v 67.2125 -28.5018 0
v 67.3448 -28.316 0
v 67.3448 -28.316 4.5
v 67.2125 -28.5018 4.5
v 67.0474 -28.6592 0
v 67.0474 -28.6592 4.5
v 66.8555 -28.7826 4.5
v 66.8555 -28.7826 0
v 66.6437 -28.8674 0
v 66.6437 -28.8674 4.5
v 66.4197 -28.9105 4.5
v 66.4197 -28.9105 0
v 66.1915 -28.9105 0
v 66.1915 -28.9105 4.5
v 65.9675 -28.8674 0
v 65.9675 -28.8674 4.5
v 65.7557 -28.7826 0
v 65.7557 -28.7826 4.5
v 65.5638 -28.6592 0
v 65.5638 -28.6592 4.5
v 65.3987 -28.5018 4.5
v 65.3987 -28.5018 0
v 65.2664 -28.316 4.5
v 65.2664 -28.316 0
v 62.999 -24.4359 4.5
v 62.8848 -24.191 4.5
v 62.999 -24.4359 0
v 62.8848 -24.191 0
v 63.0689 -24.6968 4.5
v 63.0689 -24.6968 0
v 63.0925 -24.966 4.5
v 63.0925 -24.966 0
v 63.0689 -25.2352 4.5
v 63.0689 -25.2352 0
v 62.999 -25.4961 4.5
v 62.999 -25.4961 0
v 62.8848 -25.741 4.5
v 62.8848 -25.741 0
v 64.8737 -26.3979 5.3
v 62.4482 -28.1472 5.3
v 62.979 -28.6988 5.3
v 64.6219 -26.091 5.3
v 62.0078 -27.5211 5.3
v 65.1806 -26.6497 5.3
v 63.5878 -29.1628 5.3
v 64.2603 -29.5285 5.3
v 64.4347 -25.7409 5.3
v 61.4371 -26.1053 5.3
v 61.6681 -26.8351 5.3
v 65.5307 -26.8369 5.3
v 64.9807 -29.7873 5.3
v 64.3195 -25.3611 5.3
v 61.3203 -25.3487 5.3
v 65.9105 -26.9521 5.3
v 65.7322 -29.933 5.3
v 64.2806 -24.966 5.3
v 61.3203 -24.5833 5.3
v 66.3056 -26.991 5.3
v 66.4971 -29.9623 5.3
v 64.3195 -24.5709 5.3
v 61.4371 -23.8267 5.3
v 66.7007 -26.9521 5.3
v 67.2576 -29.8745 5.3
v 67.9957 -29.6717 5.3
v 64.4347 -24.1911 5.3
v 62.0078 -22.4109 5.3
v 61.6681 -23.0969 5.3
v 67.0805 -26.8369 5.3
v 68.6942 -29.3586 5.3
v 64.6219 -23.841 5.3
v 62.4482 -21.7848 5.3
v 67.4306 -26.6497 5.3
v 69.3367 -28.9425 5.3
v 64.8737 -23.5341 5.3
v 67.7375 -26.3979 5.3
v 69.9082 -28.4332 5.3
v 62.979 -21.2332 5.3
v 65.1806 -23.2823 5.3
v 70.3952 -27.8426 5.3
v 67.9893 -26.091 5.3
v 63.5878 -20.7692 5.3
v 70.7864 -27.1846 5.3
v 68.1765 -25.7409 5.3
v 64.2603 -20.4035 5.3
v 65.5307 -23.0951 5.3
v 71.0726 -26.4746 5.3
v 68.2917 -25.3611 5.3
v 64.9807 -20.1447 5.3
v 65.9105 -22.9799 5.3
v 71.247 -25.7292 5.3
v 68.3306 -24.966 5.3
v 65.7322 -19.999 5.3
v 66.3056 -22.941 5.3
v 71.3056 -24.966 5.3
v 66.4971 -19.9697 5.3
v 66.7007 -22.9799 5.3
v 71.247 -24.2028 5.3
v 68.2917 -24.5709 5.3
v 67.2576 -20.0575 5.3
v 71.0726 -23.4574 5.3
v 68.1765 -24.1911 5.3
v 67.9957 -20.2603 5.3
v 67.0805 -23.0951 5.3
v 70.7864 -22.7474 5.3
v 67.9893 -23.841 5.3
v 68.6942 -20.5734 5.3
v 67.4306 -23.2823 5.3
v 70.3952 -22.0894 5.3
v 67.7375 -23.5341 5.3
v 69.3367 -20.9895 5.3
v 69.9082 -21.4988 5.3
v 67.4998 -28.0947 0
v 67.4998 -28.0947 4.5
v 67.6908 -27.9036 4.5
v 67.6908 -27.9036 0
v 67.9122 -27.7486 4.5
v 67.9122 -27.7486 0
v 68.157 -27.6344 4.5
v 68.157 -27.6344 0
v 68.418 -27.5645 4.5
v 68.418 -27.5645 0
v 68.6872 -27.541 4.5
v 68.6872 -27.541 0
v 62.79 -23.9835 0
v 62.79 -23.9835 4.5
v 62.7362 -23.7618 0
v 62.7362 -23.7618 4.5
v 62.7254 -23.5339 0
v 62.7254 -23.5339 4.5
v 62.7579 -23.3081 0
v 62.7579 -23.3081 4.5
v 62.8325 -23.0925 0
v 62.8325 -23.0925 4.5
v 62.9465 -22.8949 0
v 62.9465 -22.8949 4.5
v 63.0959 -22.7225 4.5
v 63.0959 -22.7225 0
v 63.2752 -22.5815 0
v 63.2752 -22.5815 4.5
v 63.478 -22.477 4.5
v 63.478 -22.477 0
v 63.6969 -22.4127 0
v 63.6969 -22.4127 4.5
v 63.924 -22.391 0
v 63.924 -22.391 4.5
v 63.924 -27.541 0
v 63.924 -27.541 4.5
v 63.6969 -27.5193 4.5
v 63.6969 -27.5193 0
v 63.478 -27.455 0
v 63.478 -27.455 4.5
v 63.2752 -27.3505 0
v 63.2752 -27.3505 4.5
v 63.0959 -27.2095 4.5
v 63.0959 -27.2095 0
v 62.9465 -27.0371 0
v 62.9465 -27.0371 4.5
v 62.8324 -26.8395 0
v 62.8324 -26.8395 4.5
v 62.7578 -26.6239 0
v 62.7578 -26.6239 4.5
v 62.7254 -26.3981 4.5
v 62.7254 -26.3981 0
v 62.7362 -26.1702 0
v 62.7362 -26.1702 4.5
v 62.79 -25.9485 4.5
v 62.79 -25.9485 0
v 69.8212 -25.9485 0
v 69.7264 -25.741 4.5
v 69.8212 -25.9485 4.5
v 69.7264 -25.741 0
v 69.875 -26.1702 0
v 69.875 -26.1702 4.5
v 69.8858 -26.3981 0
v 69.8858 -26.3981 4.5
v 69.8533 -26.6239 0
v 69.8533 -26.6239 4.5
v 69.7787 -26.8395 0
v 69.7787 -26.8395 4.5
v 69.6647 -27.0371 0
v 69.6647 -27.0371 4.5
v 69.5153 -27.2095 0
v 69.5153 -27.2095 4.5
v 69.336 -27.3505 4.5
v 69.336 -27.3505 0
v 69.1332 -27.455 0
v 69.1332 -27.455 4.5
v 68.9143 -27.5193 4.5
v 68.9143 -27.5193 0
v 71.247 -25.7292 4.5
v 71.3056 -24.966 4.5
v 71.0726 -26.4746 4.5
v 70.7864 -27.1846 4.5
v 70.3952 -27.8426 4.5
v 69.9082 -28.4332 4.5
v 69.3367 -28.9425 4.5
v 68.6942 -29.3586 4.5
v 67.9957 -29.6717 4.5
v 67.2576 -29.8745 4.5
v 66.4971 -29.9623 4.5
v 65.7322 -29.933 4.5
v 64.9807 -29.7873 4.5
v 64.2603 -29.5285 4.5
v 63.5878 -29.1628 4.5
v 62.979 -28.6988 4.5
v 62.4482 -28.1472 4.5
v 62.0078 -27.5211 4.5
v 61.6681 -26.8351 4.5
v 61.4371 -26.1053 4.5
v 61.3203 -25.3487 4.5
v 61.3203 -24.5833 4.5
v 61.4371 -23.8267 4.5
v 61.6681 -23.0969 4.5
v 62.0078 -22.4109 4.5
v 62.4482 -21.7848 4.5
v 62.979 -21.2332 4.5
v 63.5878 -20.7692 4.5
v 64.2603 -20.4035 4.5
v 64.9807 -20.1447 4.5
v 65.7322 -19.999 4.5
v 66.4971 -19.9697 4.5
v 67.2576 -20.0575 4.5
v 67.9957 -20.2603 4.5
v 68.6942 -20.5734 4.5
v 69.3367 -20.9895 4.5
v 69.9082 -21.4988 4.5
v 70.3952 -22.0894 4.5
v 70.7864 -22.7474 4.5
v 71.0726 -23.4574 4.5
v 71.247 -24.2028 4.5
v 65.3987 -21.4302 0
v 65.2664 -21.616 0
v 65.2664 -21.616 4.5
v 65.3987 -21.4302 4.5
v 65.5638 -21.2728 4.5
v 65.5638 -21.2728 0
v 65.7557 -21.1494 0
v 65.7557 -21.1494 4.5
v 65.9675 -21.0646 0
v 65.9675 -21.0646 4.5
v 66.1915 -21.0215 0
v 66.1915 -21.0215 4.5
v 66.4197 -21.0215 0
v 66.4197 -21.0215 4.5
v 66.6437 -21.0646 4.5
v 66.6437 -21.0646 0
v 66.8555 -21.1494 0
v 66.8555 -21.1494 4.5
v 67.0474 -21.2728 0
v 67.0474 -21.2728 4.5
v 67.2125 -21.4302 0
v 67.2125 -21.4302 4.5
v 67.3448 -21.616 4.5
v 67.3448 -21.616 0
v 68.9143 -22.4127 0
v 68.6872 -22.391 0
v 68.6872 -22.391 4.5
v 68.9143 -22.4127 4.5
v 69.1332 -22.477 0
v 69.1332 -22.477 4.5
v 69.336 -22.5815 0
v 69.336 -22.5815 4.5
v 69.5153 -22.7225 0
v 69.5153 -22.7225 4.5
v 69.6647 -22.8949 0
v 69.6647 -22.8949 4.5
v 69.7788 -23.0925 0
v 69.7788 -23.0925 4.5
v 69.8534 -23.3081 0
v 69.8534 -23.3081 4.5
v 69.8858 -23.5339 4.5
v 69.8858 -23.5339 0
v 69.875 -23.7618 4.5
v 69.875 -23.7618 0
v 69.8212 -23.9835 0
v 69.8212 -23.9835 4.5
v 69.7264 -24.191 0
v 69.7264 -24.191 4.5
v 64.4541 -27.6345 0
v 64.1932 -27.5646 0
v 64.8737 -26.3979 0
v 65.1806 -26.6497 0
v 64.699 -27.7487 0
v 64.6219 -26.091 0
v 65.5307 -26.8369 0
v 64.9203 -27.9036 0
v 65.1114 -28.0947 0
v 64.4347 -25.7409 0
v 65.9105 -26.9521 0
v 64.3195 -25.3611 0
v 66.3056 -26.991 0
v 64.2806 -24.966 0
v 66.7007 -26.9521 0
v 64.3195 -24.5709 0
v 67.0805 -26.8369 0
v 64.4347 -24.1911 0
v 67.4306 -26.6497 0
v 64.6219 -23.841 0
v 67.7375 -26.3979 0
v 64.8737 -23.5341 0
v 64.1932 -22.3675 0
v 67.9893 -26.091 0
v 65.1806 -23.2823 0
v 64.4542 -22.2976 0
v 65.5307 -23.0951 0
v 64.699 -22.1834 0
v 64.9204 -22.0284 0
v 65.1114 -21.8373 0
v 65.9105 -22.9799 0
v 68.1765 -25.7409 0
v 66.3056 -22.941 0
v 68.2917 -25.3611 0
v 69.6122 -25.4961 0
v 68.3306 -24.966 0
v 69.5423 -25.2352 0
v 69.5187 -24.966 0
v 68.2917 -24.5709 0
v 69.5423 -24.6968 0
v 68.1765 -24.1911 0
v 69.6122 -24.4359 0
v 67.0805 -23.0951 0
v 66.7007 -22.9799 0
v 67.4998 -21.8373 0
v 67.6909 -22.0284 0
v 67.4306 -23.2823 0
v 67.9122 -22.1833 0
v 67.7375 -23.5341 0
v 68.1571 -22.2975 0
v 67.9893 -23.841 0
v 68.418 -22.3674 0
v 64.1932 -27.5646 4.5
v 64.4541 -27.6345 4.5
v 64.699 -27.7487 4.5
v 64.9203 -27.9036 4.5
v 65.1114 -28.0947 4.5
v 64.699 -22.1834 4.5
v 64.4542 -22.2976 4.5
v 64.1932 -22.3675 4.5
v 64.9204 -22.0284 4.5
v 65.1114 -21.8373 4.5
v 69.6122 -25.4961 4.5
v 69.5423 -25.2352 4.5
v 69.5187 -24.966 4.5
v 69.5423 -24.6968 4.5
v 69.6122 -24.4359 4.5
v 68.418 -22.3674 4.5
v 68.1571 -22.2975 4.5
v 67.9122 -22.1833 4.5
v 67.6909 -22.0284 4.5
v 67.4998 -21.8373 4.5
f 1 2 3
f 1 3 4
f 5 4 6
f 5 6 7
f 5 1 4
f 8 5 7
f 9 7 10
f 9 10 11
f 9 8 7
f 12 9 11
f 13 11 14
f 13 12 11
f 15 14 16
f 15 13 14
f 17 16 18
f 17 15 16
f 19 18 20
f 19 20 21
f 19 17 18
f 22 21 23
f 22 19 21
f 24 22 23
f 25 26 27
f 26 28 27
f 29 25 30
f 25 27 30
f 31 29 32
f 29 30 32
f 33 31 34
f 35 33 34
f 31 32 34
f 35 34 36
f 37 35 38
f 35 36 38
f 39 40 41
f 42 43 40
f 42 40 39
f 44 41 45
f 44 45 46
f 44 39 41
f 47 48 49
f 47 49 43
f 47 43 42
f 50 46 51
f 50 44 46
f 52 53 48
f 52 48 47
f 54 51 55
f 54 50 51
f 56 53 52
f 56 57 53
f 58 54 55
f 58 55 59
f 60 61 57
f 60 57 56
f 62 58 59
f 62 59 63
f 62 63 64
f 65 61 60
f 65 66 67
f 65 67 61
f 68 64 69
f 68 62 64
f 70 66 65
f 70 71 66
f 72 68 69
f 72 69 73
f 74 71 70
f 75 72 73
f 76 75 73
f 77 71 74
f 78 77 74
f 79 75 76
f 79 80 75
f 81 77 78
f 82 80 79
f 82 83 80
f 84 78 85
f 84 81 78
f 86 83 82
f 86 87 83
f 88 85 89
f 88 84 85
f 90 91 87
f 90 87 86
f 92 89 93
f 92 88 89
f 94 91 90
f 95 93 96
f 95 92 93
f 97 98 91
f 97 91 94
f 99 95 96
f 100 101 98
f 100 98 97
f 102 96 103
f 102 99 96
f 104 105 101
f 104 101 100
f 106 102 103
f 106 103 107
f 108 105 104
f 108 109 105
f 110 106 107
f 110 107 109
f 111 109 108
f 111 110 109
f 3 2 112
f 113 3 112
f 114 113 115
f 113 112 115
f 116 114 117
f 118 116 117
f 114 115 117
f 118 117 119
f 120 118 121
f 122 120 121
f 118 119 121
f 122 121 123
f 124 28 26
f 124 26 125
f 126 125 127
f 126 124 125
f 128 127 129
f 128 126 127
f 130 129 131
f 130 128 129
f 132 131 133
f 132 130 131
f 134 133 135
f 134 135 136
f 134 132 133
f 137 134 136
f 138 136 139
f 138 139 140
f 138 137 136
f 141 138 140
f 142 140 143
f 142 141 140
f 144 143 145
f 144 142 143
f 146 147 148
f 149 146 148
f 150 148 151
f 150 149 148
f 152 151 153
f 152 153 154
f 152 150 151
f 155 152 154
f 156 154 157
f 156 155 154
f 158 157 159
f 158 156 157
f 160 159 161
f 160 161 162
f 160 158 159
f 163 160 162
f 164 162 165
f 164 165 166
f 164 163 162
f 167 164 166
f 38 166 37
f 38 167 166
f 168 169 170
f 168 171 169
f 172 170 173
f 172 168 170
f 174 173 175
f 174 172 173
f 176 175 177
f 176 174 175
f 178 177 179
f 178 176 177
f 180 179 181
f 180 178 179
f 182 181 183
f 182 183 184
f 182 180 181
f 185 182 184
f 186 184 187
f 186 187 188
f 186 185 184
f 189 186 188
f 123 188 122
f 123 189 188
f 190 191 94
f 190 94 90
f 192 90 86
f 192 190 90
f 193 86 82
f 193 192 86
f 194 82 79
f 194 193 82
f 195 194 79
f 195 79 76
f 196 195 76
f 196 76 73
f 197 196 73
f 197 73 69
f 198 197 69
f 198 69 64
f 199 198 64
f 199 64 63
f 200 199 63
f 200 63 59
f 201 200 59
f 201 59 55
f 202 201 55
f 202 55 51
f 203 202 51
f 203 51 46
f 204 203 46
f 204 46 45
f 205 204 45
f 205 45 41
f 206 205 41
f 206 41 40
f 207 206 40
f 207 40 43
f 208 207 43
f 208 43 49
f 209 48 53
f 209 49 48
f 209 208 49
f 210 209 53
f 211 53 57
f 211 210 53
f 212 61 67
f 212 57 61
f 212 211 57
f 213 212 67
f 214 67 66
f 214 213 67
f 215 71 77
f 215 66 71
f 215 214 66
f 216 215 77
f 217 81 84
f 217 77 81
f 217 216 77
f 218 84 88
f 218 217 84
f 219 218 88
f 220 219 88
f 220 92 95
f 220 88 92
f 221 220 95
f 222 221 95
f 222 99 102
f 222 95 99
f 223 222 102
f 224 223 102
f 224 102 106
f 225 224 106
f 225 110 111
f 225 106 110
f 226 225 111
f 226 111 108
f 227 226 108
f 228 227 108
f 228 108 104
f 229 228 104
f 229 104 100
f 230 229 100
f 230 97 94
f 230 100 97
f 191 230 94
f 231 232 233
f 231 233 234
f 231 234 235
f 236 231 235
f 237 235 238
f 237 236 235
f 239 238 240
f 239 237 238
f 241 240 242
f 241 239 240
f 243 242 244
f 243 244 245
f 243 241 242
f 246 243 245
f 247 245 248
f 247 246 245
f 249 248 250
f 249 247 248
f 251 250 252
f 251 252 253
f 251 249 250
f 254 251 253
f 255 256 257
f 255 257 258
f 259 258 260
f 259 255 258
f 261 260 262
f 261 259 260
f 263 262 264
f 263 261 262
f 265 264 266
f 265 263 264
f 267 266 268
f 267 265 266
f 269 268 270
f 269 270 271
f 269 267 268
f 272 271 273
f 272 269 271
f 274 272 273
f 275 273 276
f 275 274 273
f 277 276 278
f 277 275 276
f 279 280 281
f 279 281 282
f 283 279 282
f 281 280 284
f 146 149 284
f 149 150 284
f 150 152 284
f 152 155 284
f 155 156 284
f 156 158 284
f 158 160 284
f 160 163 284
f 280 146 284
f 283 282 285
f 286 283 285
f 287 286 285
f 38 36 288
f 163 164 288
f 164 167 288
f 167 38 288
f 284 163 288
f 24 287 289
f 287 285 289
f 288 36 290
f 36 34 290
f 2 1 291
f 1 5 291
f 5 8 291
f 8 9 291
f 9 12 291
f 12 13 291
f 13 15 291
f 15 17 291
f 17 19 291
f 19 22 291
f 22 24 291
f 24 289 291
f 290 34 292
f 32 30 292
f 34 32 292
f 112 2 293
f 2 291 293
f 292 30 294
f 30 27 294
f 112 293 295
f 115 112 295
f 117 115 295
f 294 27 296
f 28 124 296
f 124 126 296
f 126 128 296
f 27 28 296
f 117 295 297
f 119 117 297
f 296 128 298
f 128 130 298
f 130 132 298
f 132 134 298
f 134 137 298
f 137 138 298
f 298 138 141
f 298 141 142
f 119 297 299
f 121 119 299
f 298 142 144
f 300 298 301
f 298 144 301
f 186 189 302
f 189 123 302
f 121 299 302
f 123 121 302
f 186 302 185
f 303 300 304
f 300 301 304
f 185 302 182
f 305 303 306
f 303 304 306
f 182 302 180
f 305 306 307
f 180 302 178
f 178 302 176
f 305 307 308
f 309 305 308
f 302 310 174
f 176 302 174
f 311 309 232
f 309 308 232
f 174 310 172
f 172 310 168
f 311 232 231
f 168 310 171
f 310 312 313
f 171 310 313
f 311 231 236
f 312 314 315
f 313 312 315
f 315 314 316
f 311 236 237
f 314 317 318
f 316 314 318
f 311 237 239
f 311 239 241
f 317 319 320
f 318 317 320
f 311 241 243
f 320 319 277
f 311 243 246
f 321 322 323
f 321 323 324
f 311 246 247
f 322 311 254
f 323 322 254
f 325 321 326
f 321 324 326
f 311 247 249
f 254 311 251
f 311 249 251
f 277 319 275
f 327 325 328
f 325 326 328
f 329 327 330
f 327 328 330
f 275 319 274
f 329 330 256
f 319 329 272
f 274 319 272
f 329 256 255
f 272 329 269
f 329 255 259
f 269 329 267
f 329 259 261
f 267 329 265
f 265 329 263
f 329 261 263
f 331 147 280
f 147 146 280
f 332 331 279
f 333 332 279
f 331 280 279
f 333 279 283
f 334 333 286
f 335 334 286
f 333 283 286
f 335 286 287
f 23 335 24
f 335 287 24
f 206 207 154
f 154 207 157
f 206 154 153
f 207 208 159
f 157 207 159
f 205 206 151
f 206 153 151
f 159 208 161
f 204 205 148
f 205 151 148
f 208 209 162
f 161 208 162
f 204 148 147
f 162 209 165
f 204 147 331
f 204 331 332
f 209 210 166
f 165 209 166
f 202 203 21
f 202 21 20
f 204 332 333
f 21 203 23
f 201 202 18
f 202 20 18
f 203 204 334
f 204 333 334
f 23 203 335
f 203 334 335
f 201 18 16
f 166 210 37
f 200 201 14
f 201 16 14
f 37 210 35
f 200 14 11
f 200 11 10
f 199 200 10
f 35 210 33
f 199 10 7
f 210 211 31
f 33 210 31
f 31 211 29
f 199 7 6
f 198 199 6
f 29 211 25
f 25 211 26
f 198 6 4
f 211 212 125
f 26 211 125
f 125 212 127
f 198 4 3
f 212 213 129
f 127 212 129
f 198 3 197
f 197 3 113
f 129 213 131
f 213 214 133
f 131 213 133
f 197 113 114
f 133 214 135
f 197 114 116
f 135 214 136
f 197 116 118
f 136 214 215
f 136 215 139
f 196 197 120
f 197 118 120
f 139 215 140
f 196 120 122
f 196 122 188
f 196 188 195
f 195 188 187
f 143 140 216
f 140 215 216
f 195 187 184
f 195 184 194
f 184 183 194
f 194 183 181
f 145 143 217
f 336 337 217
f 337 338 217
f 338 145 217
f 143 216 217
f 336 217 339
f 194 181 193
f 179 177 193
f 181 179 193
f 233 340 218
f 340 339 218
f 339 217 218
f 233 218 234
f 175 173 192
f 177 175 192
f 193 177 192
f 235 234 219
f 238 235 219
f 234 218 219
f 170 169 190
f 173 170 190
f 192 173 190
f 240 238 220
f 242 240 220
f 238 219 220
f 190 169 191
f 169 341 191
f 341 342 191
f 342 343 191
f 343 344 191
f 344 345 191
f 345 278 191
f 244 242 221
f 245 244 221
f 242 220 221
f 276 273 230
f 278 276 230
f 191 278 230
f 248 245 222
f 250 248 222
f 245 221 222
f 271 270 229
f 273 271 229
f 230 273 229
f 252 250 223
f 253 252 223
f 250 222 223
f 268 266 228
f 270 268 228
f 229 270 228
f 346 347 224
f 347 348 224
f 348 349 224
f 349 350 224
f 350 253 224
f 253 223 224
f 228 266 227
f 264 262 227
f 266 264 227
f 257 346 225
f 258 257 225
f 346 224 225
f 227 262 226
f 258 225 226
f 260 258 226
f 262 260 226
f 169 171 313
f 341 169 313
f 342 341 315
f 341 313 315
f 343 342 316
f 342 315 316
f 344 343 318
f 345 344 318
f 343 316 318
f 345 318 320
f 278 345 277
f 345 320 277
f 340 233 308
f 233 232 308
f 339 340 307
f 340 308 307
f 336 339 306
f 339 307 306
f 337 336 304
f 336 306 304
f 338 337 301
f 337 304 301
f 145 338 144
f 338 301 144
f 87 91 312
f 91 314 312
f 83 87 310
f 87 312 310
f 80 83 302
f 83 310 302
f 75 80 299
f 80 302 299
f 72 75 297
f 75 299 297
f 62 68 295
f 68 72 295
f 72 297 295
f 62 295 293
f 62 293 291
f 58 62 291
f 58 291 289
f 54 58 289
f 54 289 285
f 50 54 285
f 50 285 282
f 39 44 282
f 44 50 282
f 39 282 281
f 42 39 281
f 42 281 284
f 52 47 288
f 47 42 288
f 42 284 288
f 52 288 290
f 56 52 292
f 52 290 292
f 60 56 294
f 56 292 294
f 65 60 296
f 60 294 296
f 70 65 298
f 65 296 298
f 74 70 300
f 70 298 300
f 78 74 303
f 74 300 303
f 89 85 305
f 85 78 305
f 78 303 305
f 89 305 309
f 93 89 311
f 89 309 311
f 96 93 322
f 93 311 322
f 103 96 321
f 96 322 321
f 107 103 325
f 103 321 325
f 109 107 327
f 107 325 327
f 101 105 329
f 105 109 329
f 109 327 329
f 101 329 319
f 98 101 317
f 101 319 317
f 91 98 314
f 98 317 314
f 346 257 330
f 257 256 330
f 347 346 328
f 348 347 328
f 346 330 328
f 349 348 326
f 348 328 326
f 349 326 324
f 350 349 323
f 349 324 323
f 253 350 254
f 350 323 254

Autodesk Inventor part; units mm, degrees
ref_plane "YZ Plane" through (0, 0, 0) normal (1, 0, 0) x (0, 1, 0)
ref_plane "XZ Plane" through (0, 0, 0) normal (0, 1, 0) x (-1, 0, 0)
ref_plane "XY Plane" through (0, 0, 0) normal (0, 0, 1) x (1, 0, 0)
sketch "スケッチ1" plane through (0, 0, 0) normal (0, 0, 1) x (1, 0, 0)
  arc A0 (69.7697, -24.216) -> (68.6872, -22.341) centre (68.6872, -23.591) ccw
  arc A1 (69.7697, -24.216) -> (69.7697, -25.716) centre (71.0687, -24.966) ccw
  arc A2 (68.6872, -27.591) -> (69.7697, -25.716) centre (68.6872, -26.341) ccw
  arc A3 (65.2231, -28.341) -> (67.3881, -28.341) centre (66.3056, -27.716) ccw
  arc A4 (68.6872, -27.591) -> (67.3881, -28.341) centre (68.6872, -29.091) ccw
  arc A5 (65.2231, -28.341) -> (63.924, -27.591) centre (63.924, -29.091) ccw
  arc A6 (63.924, -22.341) -> (62.8415, -24.216) centre (63.924, -23.591) ccw
  arc A7 (63.924, -22.341) -> (65.2231, -21.591) centre (63.924, -20.841) ccw
  line L0 (62.8415, -22.966) -> (66.3056, -20.966) construction
  circle A8 centre (66.3056, -24.966) radius 5
  arc A9 (67.3881, -21.591) -> (65.2231, -21.591) centre (66.3056, -22.216) ccw
  arc A10 (62.8415, -25.716) -> (62.8415, -24.216) centre (61.5425, -24.966) ccw
  arc A11 (67.3881, -21.591) -> (68.6872, -22.341) centre (68.6872, -20.841) ccw
  line L1 (62.8415, -26.966) -> (62.8415, -22.966) construction
  arc A12 (62.8415, -25.716) -> (63.924, -27.591) centre (63.924, -26.341) ccw
  line L2 (66.3056, -20.966) -> (69.7697, -22.966) construction
  line L3 (66.3056, -28.966) -> (62.8415, -26.966) construction
  circle A13 centre (66.3056, -24.966) radius 4 construction
  circle A14 centre (66.3056, -24.966) radius 3.2631 construction
  line L4 (69.7697, -26.966) -> (66.3056, -28.966) construction
  line L5 (69.7697, -22.966) -> (69.7697, -26.966) construction
  circle A15 centre (66.3056, -24.966) radius 2.025
  point P0 (0, 0)
  point P1 (69.7697, -26.966)
  point P2 (66.3056, -28.966)
  point P3 (65.2231, -28.341)
  point P4 (68.6872, -27.591)
  point P5 (69.7697, -25.716)
  point P6 (69.7697, -24.216)
  point P7 (63.924, -22.341)
  point P8 (62.8415, -25.716)
  point P9 (63.924, -27.591)
  dimension "d5" = 8
  dimension "d4" = 10
  dimension "d6" = 360
  dimension "d7" = 360
  dimension "d8" = 6.5263
  dimension "d9" = 1.5
  dimension "d10" = 1.25
  dimension "d11" = 4.05
extrude "押し出し1" add sketch "スケッチ1" along normal blind 4.5 contours A1 A2 A4 A3 A5 A12 A10 A6 A7 A9 A11 A0
sketch "スケッチ2" plane through (0, 0, 4.5) normal (0, 0, 1) x (1, 0, 0)
  arc A0 (68.6872, -27.591) -> (67.3881, -28.341) centre (68.6872, -29.091) ccw projected
  arc A1 (68.6872, -27.591) -> (69.7697, -25.716) centre (68.6872, -26.341) ccw projected
  arc A2 (69.7697, -24.216) -> (69.7697, -25.716) centre (71.0687, -24.966) ccw projected
  arc A3 (69.7697, -24.216) -> (68.6872, -22.341) centre (68.6872, -23.591) ccw projected
  arc A4 (67.3881, -21.591) -> (68.6872, -22.341) centre (68.6872, -20.841) ccw projected
  arc A5 (67.3881, -21.591) -> (65.2231, -21.591) centre (66.3056, -22.216) ccw projected
  arc A6 (63.924, -22.341) -> (65.2231, -21.591) centre (63.924, -20.841) ccw projected
  arc A7 (63.924, -22.341) -> (62.8415, -24.216) centre (63.924, -23.591) ccw projected
  arc A8 (62.8415, -25.716) -> (62.8415, -24.216) centre (61.5425, -24.966) ccw projected
  arc A9 (62.8415, -25.716) -> (63.924, -27.591) centre (63.924, -26.341) ccw projected
  arc A10 (65.2231, -28.341) -> (63.924, -27.591) centre (63.924, -29.091) ccw projected
  arc A11 (65.2231, -28.341) -> (67.3881, -28.341) centre (66.3056, -27.716) ccw projected
  circle A12 centre (66.3056, -24.966) radius 2.025 projected
  circle A13 centre (66.3056, -24.966) radius 5
  point P0 (0, 0)
  dimension "d14" = 10
extrude "押し出し2" add sketch "スケッチ2" along normal blind 0.8 contours A0 A11 A10 A9 A8 A7 A6 A5 A4 A3 A2 A1 | A13
sketch "スケッチ3" plane through (0, 0, 0) normal (0, 0, -1) x (-1, 0, 0)
  arc A0 (-67.3881, -28.341) -> (-68.6872, -27.591) centre (-68.6872, -29.091) ccw projected
  arc A1 (-67.3881, -28.341) -> (-65.2231, -28.341) centre (-66.3056, -27.716) ccw projected
  arc A2 (-63.924, -27.591) -> (-65.2231, -28.341) centre (-63.924, -29.091) ccw projected
  arc A3 (-63.924, -27.591) -> (-62.8415, -25.716) centre (-63.924, -26.341) ccw projected
  arc A4 (-62.8415, -24.216) -> (-62.8415, -25.716) centre (-61.5425, -24.966) ccw projected
  arc A5 (-62.8415, -24.216) -> (-63.924, -22.341) centre (-63.924, -23.591) ccw projected
  arc A6 (-65.2231, -21.591) -> (-63.924, -22.341) centre (-63.924, -20.841) ccw projected
  arc A7 (-65.2231, -21.591) -> (-67.3881, -21.591) centre (-66.3056, -22.216) ccw projected
  arc A8 (-68.6872, -22.341) -> (-67.3881, -21.591) centre (-68.6872, -20.841) ccw projected
  arc A9 (-68.6872, -22.341) -> (-69.7697, -24.216) centre (-68.6872, -23.591) ccw projected
  arc A10 (-69.7697, -25.716) -> (-69.7697, -24.216) centre (-71.0687, -24.966) ccw projected
  arc A11 (-69.7697, -25.716) -> (-68.6872, -27.591) centre (-68.6872, -26.341) ccw projected
  circle A12 centre (-66.3056, -24.966) radius 2.025 projected
  arc A13 (-65.2664, -21.616) -> (-67.3448, -21.616) centre (-66.3056, -22.216) ccw
  arc A14 (-65.2664, -21.616) -> (-63.924, -22.391) centre (-63.924, -20.841) ccw
  arc A15 (-62.8848, -24.191) -> (-63.924, -22.391) centre (-63.924, -23.591) ccw
  arc A16 (-62.8848, -24.191) -> (-62.8848, -25.741) centre (-61.5425, -24.966) ccw
  arc A17 (-63.924, -27.541) -> (-62.8848, -25.741) centre (-63.924, -26.341) ccw
  arc A18 (-63.924, -27.541) -> (-65.2664, -28.316) centre (-63.924, -29.091) ccw
  arc A19 (-67.3448, -28.316) -> (-65.2664, -28.316) centre (-66.3056, -27.716) ccw
  arc A20 (-67.3448, -28.316) -> (-68.6872, -27.541) centre (-68.6872, -29.091) ccw
  arc A21 (-69.7264, -25.741) -> (-68.6872, -27.541) centre (-68.6872, -26.341) ccw
  arc A22 (-69.7264, -25.741) -> (-69.7264, -24.191) centre (-71.0687, -24.966) ccw
  arc A23 (-68.6872, -22.391) -> (-69.7264, -24.191) centre (-68.6872, -23.591) ccw
  arc A24 (-68.6872, -22.391) -> (-67.3448, -21.616) centre (-68.6872, -20.841) ccw
  point P0 (0, 0)
  dimension "d17" = 0.05
extrude "押し出し3" cut sketch "スケッチ3" against normal up to surface (4.5 mm away) contours A0 A11 A10 A9 A8 A7 A6 A5 A4 A3 A2 A1
properties part number "2ギア接続部" material "アルミニウム 2014-T4"
